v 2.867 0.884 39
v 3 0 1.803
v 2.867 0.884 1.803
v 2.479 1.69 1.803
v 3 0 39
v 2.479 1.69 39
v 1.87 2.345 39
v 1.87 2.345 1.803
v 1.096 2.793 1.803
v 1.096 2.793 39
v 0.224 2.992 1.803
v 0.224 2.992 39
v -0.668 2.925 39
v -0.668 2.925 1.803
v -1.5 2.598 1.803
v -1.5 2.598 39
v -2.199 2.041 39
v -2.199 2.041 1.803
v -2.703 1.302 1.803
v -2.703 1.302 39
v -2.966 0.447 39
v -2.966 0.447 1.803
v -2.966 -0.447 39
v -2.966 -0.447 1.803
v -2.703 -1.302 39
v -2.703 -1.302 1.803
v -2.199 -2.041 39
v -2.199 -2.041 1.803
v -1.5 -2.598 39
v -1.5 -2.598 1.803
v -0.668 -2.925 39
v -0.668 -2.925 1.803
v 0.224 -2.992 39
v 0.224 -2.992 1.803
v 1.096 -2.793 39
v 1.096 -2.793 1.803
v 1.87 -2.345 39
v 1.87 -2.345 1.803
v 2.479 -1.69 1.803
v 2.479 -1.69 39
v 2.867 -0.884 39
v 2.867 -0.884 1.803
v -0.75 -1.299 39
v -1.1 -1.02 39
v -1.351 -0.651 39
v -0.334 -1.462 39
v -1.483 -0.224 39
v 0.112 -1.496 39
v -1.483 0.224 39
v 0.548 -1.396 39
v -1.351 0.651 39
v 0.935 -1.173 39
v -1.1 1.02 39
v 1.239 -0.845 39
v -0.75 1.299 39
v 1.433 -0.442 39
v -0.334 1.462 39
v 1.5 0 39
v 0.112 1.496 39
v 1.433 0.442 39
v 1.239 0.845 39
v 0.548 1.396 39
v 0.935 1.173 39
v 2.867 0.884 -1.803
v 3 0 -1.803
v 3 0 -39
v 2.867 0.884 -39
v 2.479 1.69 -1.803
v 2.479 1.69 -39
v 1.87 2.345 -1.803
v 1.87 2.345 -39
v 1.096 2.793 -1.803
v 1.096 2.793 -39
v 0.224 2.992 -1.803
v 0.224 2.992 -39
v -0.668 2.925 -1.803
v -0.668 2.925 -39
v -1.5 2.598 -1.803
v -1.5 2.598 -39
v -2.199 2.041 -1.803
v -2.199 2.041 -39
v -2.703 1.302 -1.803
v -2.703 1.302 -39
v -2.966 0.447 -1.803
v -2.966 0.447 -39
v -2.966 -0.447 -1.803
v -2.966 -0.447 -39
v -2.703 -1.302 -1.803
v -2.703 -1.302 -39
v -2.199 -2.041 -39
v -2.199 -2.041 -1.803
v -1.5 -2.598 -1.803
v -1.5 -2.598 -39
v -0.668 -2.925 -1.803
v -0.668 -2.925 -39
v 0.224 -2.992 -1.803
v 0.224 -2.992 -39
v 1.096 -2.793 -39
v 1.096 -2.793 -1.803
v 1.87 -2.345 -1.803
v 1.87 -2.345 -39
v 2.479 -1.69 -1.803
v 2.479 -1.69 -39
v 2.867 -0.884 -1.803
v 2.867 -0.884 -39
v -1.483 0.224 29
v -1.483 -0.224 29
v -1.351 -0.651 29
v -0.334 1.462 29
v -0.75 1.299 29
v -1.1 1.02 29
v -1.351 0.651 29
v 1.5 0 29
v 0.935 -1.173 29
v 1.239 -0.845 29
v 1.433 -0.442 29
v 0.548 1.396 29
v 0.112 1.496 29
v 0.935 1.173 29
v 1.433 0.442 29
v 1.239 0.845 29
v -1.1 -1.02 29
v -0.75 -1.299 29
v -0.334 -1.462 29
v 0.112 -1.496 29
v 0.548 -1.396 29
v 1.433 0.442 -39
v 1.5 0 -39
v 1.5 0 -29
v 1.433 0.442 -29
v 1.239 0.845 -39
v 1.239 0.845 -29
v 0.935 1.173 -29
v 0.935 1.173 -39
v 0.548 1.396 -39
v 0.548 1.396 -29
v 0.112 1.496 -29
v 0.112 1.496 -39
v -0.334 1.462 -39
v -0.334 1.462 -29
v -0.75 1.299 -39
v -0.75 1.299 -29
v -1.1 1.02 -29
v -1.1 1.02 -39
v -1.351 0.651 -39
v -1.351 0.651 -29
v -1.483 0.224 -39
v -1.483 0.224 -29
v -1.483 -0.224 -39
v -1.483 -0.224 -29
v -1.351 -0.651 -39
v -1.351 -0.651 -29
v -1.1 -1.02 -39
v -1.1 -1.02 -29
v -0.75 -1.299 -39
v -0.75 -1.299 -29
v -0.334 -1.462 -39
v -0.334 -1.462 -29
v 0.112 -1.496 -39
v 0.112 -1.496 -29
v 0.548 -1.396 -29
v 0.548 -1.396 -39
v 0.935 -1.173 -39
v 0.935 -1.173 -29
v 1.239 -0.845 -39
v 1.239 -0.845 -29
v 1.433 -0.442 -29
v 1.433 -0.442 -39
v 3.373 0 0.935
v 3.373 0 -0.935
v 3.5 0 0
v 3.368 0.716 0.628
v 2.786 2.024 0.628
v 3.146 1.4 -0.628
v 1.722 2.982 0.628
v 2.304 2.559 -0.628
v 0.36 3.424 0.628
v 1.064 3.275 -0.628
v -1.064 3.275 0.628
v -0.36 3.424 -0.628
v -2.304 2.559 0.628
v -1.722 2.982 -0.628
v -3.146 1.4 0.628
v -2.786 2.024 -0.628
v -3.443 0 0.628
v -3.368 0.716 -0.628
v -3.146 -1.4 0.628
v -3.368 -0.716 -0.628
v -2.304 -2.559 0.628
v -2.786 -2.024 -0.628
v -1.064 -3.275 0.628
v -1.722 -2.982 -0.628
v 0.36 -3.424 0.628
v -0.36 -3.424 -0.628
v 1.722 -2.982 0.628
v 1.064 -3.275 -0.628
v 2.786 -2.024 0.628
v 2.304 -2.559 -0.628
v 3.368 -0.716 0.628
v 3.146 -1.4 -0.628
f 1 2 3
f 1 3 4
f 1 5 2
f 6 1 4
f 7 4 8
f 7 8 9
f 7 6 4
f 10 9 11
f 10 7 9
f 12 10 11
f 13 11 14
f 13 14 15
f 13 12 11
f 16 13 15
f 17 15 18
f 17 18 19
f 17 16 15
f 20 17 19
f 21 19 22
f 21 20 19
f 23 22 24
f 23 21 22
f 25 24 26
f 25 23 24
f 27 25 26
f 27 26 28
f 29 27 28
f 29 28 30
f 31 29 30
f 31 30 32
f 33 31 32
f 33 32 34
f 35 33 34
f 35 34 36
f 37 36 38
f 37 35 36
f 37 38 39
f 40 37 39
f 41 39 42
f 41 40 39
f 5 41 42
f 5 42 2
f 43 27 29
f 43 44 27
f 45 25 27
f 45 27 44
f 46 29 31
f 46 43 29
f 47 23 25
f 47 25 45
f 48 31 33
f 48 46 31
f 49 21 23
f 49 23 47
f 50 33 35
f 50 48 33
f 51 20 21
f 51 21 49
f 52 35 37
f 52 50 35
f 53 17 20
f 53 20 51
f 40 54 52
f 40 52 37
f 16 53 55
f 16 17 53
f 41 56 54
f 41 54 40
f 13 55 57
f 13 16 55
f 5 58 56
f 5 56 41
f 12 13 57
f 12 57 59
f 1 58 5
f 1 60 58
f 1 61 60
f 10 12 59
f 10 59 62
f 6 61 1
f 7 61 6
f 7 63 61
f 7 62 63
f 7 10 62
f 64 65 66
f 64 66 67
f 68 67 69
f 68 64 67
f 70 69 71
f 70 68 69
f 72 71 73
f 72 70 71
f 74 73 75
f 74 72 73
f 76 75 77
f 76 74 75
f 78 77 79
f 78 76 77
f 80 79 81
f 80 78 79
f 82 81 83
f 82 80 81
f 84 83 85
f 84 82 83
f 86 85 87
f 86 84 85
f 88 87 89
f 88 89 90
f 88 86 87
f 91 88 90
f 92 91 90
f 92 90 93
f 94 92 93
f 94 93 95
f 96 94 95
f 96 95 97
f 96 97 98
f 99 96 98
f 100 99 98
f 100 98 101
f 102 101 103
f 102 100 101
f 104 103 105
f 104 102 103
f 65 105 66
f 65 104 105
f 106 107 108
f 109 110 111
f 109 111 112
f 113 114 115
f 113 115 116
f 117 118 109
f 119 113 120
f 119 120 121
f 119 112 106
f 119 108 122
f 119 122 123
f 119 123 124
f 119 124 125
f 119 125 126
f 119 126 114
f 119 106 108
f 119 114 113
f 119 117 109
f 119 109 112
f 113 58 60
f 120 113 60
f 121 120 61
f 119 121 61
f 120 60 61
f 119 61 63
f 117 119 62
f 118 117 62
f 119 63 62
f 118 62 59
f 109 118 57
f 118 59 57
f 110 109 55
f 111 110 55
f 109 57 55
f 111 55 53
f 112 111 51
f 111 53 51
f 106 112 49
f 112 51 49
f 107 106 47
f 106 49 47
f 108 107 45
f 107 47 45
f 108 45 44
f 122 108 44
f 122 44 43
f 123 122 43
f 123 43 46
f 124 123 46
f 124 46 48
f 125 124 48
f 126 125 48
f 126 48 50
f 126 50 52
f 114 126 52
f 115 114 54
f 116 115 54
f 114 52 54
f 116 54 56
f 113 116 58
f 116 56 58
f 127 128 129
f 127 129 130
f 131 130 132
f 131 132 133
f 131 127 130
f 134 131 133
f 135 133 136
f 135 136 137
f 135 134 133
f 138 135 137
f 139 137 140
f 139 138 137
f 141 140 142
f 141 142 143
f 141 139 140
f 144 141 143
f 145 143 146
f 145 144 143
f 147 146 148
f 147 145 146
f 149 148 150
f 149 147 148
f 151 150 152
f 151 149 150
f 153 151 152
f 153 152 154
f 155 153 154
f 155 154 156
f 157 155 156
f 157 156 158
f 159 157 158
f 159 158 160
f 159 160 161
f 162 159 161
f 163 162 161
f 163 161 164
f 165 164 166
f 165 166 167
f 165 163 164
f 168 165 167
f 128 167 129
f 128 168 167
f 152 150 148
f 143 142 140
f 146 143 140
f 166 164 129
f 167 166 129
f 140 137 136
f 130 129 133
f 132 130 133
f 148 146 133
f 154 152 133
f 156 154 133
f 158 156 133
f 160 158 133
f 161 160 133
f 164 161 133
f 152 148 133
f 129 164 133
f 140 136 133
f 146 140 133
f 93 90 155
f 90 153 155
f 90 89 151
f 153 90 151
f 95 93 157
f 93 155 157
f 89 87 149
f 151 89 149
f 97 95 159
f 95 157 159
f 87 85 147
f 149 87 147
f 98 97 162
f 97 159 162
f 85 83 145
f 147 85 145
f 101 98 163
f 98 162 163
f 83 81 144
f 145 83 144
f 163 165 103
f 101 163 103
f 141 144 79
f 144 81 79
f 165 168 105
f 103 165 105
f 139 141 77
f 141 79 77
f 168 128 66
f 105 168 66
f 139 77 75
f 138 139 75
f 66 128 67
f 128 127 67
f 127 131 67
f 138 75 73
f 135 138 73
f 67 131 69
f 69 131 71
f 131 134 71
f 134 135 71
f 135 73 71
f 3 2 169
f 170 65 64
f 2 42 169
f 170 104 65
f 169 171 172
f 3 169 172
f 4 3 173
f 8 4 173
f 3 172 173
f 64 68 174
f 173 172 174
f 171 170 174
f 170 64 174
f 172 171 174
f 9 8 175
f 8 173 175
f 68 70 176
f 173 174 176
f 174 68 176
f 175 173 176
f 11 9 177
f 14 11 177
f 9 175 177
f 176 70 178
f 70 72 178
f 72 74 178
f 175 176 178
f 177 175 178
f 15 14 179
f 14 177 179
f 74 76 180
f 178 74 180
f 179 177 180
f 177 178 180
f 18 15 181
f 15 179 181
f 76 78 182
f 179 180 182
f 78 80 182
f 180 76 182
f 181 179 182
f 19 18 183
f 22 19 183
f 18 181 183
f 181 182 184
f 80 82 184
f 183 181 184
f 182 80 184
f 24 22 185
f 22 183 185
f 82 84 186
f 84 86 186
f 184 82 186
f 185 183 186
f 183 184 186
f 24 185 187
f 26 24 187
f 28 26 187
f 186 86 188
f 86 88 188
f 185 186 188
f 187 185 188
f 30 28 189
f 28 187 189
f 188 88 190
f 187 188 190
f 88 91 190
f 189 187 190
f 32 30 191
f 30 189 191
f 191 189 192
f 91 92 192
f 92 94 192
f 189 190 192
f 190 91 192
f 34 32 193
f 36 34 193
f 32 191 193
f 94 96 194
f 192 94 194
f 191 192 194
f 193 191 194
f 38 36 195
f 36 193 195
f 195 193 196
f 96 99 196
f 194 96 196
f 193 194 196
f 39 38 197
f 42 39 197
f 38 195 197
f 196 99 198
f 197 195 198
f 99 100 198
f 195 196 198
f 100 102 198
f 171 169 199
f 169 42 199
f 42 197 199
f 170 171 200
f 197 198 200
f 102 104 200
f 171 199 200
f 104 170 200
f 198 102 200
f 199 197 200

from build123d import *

# Parameters (mm, degrees)
ESQUISSE1_R             = 3
EXTRUSION1_DEPTH        = 39
ESQUISSE2_R             = 1.5
ENL_V_MAT_EXTRU_1_DEPTH = 10


with BuildPart() as part:
    # Esquisse1 → Extrusion1 (new, symmetric)
    with BuildSketch(Plane.XY):
        Circle(ESQUISSE1_R)
    extrude(amount=EXTRUSION1_DEPTH, both=True)

    # Esquisse2 → Enlèv. mat.-Extru.1 (cut)
    with BuildSketch(Plane.XY.offset(39)):
        Circle(ESQUISSE2_R)
    enl_v_mat_extru_1 = extrude(amount=-ENL_V_MAT_EXTRU_1_DEPTH, mode=Mode.SUBTRACT)

    # Symétrie1: Enlèv. mat.-Extru.1 across plane
    add(enl_v_mat_extru_1.mirror(Plane.XY), mode=Mode.SUBTRACT)

    # Esquisse3 → Révolution1 (revolve)
    with BuildSketch(Plane(origin=(0, 0, 0), x_dir=(1, 0, 0), z_dir=(0, 1, 0))):
        with BuildLine():
            Line((0, 3.5), (0, -3.5))
            ThreePointArc((0, -3.5), (3.5, 0), (0, 3.5))
        make_face()
    revolve(axis=Axis((0, 0, -41.019136627), (0, 0, 1)))


solid = part.part
